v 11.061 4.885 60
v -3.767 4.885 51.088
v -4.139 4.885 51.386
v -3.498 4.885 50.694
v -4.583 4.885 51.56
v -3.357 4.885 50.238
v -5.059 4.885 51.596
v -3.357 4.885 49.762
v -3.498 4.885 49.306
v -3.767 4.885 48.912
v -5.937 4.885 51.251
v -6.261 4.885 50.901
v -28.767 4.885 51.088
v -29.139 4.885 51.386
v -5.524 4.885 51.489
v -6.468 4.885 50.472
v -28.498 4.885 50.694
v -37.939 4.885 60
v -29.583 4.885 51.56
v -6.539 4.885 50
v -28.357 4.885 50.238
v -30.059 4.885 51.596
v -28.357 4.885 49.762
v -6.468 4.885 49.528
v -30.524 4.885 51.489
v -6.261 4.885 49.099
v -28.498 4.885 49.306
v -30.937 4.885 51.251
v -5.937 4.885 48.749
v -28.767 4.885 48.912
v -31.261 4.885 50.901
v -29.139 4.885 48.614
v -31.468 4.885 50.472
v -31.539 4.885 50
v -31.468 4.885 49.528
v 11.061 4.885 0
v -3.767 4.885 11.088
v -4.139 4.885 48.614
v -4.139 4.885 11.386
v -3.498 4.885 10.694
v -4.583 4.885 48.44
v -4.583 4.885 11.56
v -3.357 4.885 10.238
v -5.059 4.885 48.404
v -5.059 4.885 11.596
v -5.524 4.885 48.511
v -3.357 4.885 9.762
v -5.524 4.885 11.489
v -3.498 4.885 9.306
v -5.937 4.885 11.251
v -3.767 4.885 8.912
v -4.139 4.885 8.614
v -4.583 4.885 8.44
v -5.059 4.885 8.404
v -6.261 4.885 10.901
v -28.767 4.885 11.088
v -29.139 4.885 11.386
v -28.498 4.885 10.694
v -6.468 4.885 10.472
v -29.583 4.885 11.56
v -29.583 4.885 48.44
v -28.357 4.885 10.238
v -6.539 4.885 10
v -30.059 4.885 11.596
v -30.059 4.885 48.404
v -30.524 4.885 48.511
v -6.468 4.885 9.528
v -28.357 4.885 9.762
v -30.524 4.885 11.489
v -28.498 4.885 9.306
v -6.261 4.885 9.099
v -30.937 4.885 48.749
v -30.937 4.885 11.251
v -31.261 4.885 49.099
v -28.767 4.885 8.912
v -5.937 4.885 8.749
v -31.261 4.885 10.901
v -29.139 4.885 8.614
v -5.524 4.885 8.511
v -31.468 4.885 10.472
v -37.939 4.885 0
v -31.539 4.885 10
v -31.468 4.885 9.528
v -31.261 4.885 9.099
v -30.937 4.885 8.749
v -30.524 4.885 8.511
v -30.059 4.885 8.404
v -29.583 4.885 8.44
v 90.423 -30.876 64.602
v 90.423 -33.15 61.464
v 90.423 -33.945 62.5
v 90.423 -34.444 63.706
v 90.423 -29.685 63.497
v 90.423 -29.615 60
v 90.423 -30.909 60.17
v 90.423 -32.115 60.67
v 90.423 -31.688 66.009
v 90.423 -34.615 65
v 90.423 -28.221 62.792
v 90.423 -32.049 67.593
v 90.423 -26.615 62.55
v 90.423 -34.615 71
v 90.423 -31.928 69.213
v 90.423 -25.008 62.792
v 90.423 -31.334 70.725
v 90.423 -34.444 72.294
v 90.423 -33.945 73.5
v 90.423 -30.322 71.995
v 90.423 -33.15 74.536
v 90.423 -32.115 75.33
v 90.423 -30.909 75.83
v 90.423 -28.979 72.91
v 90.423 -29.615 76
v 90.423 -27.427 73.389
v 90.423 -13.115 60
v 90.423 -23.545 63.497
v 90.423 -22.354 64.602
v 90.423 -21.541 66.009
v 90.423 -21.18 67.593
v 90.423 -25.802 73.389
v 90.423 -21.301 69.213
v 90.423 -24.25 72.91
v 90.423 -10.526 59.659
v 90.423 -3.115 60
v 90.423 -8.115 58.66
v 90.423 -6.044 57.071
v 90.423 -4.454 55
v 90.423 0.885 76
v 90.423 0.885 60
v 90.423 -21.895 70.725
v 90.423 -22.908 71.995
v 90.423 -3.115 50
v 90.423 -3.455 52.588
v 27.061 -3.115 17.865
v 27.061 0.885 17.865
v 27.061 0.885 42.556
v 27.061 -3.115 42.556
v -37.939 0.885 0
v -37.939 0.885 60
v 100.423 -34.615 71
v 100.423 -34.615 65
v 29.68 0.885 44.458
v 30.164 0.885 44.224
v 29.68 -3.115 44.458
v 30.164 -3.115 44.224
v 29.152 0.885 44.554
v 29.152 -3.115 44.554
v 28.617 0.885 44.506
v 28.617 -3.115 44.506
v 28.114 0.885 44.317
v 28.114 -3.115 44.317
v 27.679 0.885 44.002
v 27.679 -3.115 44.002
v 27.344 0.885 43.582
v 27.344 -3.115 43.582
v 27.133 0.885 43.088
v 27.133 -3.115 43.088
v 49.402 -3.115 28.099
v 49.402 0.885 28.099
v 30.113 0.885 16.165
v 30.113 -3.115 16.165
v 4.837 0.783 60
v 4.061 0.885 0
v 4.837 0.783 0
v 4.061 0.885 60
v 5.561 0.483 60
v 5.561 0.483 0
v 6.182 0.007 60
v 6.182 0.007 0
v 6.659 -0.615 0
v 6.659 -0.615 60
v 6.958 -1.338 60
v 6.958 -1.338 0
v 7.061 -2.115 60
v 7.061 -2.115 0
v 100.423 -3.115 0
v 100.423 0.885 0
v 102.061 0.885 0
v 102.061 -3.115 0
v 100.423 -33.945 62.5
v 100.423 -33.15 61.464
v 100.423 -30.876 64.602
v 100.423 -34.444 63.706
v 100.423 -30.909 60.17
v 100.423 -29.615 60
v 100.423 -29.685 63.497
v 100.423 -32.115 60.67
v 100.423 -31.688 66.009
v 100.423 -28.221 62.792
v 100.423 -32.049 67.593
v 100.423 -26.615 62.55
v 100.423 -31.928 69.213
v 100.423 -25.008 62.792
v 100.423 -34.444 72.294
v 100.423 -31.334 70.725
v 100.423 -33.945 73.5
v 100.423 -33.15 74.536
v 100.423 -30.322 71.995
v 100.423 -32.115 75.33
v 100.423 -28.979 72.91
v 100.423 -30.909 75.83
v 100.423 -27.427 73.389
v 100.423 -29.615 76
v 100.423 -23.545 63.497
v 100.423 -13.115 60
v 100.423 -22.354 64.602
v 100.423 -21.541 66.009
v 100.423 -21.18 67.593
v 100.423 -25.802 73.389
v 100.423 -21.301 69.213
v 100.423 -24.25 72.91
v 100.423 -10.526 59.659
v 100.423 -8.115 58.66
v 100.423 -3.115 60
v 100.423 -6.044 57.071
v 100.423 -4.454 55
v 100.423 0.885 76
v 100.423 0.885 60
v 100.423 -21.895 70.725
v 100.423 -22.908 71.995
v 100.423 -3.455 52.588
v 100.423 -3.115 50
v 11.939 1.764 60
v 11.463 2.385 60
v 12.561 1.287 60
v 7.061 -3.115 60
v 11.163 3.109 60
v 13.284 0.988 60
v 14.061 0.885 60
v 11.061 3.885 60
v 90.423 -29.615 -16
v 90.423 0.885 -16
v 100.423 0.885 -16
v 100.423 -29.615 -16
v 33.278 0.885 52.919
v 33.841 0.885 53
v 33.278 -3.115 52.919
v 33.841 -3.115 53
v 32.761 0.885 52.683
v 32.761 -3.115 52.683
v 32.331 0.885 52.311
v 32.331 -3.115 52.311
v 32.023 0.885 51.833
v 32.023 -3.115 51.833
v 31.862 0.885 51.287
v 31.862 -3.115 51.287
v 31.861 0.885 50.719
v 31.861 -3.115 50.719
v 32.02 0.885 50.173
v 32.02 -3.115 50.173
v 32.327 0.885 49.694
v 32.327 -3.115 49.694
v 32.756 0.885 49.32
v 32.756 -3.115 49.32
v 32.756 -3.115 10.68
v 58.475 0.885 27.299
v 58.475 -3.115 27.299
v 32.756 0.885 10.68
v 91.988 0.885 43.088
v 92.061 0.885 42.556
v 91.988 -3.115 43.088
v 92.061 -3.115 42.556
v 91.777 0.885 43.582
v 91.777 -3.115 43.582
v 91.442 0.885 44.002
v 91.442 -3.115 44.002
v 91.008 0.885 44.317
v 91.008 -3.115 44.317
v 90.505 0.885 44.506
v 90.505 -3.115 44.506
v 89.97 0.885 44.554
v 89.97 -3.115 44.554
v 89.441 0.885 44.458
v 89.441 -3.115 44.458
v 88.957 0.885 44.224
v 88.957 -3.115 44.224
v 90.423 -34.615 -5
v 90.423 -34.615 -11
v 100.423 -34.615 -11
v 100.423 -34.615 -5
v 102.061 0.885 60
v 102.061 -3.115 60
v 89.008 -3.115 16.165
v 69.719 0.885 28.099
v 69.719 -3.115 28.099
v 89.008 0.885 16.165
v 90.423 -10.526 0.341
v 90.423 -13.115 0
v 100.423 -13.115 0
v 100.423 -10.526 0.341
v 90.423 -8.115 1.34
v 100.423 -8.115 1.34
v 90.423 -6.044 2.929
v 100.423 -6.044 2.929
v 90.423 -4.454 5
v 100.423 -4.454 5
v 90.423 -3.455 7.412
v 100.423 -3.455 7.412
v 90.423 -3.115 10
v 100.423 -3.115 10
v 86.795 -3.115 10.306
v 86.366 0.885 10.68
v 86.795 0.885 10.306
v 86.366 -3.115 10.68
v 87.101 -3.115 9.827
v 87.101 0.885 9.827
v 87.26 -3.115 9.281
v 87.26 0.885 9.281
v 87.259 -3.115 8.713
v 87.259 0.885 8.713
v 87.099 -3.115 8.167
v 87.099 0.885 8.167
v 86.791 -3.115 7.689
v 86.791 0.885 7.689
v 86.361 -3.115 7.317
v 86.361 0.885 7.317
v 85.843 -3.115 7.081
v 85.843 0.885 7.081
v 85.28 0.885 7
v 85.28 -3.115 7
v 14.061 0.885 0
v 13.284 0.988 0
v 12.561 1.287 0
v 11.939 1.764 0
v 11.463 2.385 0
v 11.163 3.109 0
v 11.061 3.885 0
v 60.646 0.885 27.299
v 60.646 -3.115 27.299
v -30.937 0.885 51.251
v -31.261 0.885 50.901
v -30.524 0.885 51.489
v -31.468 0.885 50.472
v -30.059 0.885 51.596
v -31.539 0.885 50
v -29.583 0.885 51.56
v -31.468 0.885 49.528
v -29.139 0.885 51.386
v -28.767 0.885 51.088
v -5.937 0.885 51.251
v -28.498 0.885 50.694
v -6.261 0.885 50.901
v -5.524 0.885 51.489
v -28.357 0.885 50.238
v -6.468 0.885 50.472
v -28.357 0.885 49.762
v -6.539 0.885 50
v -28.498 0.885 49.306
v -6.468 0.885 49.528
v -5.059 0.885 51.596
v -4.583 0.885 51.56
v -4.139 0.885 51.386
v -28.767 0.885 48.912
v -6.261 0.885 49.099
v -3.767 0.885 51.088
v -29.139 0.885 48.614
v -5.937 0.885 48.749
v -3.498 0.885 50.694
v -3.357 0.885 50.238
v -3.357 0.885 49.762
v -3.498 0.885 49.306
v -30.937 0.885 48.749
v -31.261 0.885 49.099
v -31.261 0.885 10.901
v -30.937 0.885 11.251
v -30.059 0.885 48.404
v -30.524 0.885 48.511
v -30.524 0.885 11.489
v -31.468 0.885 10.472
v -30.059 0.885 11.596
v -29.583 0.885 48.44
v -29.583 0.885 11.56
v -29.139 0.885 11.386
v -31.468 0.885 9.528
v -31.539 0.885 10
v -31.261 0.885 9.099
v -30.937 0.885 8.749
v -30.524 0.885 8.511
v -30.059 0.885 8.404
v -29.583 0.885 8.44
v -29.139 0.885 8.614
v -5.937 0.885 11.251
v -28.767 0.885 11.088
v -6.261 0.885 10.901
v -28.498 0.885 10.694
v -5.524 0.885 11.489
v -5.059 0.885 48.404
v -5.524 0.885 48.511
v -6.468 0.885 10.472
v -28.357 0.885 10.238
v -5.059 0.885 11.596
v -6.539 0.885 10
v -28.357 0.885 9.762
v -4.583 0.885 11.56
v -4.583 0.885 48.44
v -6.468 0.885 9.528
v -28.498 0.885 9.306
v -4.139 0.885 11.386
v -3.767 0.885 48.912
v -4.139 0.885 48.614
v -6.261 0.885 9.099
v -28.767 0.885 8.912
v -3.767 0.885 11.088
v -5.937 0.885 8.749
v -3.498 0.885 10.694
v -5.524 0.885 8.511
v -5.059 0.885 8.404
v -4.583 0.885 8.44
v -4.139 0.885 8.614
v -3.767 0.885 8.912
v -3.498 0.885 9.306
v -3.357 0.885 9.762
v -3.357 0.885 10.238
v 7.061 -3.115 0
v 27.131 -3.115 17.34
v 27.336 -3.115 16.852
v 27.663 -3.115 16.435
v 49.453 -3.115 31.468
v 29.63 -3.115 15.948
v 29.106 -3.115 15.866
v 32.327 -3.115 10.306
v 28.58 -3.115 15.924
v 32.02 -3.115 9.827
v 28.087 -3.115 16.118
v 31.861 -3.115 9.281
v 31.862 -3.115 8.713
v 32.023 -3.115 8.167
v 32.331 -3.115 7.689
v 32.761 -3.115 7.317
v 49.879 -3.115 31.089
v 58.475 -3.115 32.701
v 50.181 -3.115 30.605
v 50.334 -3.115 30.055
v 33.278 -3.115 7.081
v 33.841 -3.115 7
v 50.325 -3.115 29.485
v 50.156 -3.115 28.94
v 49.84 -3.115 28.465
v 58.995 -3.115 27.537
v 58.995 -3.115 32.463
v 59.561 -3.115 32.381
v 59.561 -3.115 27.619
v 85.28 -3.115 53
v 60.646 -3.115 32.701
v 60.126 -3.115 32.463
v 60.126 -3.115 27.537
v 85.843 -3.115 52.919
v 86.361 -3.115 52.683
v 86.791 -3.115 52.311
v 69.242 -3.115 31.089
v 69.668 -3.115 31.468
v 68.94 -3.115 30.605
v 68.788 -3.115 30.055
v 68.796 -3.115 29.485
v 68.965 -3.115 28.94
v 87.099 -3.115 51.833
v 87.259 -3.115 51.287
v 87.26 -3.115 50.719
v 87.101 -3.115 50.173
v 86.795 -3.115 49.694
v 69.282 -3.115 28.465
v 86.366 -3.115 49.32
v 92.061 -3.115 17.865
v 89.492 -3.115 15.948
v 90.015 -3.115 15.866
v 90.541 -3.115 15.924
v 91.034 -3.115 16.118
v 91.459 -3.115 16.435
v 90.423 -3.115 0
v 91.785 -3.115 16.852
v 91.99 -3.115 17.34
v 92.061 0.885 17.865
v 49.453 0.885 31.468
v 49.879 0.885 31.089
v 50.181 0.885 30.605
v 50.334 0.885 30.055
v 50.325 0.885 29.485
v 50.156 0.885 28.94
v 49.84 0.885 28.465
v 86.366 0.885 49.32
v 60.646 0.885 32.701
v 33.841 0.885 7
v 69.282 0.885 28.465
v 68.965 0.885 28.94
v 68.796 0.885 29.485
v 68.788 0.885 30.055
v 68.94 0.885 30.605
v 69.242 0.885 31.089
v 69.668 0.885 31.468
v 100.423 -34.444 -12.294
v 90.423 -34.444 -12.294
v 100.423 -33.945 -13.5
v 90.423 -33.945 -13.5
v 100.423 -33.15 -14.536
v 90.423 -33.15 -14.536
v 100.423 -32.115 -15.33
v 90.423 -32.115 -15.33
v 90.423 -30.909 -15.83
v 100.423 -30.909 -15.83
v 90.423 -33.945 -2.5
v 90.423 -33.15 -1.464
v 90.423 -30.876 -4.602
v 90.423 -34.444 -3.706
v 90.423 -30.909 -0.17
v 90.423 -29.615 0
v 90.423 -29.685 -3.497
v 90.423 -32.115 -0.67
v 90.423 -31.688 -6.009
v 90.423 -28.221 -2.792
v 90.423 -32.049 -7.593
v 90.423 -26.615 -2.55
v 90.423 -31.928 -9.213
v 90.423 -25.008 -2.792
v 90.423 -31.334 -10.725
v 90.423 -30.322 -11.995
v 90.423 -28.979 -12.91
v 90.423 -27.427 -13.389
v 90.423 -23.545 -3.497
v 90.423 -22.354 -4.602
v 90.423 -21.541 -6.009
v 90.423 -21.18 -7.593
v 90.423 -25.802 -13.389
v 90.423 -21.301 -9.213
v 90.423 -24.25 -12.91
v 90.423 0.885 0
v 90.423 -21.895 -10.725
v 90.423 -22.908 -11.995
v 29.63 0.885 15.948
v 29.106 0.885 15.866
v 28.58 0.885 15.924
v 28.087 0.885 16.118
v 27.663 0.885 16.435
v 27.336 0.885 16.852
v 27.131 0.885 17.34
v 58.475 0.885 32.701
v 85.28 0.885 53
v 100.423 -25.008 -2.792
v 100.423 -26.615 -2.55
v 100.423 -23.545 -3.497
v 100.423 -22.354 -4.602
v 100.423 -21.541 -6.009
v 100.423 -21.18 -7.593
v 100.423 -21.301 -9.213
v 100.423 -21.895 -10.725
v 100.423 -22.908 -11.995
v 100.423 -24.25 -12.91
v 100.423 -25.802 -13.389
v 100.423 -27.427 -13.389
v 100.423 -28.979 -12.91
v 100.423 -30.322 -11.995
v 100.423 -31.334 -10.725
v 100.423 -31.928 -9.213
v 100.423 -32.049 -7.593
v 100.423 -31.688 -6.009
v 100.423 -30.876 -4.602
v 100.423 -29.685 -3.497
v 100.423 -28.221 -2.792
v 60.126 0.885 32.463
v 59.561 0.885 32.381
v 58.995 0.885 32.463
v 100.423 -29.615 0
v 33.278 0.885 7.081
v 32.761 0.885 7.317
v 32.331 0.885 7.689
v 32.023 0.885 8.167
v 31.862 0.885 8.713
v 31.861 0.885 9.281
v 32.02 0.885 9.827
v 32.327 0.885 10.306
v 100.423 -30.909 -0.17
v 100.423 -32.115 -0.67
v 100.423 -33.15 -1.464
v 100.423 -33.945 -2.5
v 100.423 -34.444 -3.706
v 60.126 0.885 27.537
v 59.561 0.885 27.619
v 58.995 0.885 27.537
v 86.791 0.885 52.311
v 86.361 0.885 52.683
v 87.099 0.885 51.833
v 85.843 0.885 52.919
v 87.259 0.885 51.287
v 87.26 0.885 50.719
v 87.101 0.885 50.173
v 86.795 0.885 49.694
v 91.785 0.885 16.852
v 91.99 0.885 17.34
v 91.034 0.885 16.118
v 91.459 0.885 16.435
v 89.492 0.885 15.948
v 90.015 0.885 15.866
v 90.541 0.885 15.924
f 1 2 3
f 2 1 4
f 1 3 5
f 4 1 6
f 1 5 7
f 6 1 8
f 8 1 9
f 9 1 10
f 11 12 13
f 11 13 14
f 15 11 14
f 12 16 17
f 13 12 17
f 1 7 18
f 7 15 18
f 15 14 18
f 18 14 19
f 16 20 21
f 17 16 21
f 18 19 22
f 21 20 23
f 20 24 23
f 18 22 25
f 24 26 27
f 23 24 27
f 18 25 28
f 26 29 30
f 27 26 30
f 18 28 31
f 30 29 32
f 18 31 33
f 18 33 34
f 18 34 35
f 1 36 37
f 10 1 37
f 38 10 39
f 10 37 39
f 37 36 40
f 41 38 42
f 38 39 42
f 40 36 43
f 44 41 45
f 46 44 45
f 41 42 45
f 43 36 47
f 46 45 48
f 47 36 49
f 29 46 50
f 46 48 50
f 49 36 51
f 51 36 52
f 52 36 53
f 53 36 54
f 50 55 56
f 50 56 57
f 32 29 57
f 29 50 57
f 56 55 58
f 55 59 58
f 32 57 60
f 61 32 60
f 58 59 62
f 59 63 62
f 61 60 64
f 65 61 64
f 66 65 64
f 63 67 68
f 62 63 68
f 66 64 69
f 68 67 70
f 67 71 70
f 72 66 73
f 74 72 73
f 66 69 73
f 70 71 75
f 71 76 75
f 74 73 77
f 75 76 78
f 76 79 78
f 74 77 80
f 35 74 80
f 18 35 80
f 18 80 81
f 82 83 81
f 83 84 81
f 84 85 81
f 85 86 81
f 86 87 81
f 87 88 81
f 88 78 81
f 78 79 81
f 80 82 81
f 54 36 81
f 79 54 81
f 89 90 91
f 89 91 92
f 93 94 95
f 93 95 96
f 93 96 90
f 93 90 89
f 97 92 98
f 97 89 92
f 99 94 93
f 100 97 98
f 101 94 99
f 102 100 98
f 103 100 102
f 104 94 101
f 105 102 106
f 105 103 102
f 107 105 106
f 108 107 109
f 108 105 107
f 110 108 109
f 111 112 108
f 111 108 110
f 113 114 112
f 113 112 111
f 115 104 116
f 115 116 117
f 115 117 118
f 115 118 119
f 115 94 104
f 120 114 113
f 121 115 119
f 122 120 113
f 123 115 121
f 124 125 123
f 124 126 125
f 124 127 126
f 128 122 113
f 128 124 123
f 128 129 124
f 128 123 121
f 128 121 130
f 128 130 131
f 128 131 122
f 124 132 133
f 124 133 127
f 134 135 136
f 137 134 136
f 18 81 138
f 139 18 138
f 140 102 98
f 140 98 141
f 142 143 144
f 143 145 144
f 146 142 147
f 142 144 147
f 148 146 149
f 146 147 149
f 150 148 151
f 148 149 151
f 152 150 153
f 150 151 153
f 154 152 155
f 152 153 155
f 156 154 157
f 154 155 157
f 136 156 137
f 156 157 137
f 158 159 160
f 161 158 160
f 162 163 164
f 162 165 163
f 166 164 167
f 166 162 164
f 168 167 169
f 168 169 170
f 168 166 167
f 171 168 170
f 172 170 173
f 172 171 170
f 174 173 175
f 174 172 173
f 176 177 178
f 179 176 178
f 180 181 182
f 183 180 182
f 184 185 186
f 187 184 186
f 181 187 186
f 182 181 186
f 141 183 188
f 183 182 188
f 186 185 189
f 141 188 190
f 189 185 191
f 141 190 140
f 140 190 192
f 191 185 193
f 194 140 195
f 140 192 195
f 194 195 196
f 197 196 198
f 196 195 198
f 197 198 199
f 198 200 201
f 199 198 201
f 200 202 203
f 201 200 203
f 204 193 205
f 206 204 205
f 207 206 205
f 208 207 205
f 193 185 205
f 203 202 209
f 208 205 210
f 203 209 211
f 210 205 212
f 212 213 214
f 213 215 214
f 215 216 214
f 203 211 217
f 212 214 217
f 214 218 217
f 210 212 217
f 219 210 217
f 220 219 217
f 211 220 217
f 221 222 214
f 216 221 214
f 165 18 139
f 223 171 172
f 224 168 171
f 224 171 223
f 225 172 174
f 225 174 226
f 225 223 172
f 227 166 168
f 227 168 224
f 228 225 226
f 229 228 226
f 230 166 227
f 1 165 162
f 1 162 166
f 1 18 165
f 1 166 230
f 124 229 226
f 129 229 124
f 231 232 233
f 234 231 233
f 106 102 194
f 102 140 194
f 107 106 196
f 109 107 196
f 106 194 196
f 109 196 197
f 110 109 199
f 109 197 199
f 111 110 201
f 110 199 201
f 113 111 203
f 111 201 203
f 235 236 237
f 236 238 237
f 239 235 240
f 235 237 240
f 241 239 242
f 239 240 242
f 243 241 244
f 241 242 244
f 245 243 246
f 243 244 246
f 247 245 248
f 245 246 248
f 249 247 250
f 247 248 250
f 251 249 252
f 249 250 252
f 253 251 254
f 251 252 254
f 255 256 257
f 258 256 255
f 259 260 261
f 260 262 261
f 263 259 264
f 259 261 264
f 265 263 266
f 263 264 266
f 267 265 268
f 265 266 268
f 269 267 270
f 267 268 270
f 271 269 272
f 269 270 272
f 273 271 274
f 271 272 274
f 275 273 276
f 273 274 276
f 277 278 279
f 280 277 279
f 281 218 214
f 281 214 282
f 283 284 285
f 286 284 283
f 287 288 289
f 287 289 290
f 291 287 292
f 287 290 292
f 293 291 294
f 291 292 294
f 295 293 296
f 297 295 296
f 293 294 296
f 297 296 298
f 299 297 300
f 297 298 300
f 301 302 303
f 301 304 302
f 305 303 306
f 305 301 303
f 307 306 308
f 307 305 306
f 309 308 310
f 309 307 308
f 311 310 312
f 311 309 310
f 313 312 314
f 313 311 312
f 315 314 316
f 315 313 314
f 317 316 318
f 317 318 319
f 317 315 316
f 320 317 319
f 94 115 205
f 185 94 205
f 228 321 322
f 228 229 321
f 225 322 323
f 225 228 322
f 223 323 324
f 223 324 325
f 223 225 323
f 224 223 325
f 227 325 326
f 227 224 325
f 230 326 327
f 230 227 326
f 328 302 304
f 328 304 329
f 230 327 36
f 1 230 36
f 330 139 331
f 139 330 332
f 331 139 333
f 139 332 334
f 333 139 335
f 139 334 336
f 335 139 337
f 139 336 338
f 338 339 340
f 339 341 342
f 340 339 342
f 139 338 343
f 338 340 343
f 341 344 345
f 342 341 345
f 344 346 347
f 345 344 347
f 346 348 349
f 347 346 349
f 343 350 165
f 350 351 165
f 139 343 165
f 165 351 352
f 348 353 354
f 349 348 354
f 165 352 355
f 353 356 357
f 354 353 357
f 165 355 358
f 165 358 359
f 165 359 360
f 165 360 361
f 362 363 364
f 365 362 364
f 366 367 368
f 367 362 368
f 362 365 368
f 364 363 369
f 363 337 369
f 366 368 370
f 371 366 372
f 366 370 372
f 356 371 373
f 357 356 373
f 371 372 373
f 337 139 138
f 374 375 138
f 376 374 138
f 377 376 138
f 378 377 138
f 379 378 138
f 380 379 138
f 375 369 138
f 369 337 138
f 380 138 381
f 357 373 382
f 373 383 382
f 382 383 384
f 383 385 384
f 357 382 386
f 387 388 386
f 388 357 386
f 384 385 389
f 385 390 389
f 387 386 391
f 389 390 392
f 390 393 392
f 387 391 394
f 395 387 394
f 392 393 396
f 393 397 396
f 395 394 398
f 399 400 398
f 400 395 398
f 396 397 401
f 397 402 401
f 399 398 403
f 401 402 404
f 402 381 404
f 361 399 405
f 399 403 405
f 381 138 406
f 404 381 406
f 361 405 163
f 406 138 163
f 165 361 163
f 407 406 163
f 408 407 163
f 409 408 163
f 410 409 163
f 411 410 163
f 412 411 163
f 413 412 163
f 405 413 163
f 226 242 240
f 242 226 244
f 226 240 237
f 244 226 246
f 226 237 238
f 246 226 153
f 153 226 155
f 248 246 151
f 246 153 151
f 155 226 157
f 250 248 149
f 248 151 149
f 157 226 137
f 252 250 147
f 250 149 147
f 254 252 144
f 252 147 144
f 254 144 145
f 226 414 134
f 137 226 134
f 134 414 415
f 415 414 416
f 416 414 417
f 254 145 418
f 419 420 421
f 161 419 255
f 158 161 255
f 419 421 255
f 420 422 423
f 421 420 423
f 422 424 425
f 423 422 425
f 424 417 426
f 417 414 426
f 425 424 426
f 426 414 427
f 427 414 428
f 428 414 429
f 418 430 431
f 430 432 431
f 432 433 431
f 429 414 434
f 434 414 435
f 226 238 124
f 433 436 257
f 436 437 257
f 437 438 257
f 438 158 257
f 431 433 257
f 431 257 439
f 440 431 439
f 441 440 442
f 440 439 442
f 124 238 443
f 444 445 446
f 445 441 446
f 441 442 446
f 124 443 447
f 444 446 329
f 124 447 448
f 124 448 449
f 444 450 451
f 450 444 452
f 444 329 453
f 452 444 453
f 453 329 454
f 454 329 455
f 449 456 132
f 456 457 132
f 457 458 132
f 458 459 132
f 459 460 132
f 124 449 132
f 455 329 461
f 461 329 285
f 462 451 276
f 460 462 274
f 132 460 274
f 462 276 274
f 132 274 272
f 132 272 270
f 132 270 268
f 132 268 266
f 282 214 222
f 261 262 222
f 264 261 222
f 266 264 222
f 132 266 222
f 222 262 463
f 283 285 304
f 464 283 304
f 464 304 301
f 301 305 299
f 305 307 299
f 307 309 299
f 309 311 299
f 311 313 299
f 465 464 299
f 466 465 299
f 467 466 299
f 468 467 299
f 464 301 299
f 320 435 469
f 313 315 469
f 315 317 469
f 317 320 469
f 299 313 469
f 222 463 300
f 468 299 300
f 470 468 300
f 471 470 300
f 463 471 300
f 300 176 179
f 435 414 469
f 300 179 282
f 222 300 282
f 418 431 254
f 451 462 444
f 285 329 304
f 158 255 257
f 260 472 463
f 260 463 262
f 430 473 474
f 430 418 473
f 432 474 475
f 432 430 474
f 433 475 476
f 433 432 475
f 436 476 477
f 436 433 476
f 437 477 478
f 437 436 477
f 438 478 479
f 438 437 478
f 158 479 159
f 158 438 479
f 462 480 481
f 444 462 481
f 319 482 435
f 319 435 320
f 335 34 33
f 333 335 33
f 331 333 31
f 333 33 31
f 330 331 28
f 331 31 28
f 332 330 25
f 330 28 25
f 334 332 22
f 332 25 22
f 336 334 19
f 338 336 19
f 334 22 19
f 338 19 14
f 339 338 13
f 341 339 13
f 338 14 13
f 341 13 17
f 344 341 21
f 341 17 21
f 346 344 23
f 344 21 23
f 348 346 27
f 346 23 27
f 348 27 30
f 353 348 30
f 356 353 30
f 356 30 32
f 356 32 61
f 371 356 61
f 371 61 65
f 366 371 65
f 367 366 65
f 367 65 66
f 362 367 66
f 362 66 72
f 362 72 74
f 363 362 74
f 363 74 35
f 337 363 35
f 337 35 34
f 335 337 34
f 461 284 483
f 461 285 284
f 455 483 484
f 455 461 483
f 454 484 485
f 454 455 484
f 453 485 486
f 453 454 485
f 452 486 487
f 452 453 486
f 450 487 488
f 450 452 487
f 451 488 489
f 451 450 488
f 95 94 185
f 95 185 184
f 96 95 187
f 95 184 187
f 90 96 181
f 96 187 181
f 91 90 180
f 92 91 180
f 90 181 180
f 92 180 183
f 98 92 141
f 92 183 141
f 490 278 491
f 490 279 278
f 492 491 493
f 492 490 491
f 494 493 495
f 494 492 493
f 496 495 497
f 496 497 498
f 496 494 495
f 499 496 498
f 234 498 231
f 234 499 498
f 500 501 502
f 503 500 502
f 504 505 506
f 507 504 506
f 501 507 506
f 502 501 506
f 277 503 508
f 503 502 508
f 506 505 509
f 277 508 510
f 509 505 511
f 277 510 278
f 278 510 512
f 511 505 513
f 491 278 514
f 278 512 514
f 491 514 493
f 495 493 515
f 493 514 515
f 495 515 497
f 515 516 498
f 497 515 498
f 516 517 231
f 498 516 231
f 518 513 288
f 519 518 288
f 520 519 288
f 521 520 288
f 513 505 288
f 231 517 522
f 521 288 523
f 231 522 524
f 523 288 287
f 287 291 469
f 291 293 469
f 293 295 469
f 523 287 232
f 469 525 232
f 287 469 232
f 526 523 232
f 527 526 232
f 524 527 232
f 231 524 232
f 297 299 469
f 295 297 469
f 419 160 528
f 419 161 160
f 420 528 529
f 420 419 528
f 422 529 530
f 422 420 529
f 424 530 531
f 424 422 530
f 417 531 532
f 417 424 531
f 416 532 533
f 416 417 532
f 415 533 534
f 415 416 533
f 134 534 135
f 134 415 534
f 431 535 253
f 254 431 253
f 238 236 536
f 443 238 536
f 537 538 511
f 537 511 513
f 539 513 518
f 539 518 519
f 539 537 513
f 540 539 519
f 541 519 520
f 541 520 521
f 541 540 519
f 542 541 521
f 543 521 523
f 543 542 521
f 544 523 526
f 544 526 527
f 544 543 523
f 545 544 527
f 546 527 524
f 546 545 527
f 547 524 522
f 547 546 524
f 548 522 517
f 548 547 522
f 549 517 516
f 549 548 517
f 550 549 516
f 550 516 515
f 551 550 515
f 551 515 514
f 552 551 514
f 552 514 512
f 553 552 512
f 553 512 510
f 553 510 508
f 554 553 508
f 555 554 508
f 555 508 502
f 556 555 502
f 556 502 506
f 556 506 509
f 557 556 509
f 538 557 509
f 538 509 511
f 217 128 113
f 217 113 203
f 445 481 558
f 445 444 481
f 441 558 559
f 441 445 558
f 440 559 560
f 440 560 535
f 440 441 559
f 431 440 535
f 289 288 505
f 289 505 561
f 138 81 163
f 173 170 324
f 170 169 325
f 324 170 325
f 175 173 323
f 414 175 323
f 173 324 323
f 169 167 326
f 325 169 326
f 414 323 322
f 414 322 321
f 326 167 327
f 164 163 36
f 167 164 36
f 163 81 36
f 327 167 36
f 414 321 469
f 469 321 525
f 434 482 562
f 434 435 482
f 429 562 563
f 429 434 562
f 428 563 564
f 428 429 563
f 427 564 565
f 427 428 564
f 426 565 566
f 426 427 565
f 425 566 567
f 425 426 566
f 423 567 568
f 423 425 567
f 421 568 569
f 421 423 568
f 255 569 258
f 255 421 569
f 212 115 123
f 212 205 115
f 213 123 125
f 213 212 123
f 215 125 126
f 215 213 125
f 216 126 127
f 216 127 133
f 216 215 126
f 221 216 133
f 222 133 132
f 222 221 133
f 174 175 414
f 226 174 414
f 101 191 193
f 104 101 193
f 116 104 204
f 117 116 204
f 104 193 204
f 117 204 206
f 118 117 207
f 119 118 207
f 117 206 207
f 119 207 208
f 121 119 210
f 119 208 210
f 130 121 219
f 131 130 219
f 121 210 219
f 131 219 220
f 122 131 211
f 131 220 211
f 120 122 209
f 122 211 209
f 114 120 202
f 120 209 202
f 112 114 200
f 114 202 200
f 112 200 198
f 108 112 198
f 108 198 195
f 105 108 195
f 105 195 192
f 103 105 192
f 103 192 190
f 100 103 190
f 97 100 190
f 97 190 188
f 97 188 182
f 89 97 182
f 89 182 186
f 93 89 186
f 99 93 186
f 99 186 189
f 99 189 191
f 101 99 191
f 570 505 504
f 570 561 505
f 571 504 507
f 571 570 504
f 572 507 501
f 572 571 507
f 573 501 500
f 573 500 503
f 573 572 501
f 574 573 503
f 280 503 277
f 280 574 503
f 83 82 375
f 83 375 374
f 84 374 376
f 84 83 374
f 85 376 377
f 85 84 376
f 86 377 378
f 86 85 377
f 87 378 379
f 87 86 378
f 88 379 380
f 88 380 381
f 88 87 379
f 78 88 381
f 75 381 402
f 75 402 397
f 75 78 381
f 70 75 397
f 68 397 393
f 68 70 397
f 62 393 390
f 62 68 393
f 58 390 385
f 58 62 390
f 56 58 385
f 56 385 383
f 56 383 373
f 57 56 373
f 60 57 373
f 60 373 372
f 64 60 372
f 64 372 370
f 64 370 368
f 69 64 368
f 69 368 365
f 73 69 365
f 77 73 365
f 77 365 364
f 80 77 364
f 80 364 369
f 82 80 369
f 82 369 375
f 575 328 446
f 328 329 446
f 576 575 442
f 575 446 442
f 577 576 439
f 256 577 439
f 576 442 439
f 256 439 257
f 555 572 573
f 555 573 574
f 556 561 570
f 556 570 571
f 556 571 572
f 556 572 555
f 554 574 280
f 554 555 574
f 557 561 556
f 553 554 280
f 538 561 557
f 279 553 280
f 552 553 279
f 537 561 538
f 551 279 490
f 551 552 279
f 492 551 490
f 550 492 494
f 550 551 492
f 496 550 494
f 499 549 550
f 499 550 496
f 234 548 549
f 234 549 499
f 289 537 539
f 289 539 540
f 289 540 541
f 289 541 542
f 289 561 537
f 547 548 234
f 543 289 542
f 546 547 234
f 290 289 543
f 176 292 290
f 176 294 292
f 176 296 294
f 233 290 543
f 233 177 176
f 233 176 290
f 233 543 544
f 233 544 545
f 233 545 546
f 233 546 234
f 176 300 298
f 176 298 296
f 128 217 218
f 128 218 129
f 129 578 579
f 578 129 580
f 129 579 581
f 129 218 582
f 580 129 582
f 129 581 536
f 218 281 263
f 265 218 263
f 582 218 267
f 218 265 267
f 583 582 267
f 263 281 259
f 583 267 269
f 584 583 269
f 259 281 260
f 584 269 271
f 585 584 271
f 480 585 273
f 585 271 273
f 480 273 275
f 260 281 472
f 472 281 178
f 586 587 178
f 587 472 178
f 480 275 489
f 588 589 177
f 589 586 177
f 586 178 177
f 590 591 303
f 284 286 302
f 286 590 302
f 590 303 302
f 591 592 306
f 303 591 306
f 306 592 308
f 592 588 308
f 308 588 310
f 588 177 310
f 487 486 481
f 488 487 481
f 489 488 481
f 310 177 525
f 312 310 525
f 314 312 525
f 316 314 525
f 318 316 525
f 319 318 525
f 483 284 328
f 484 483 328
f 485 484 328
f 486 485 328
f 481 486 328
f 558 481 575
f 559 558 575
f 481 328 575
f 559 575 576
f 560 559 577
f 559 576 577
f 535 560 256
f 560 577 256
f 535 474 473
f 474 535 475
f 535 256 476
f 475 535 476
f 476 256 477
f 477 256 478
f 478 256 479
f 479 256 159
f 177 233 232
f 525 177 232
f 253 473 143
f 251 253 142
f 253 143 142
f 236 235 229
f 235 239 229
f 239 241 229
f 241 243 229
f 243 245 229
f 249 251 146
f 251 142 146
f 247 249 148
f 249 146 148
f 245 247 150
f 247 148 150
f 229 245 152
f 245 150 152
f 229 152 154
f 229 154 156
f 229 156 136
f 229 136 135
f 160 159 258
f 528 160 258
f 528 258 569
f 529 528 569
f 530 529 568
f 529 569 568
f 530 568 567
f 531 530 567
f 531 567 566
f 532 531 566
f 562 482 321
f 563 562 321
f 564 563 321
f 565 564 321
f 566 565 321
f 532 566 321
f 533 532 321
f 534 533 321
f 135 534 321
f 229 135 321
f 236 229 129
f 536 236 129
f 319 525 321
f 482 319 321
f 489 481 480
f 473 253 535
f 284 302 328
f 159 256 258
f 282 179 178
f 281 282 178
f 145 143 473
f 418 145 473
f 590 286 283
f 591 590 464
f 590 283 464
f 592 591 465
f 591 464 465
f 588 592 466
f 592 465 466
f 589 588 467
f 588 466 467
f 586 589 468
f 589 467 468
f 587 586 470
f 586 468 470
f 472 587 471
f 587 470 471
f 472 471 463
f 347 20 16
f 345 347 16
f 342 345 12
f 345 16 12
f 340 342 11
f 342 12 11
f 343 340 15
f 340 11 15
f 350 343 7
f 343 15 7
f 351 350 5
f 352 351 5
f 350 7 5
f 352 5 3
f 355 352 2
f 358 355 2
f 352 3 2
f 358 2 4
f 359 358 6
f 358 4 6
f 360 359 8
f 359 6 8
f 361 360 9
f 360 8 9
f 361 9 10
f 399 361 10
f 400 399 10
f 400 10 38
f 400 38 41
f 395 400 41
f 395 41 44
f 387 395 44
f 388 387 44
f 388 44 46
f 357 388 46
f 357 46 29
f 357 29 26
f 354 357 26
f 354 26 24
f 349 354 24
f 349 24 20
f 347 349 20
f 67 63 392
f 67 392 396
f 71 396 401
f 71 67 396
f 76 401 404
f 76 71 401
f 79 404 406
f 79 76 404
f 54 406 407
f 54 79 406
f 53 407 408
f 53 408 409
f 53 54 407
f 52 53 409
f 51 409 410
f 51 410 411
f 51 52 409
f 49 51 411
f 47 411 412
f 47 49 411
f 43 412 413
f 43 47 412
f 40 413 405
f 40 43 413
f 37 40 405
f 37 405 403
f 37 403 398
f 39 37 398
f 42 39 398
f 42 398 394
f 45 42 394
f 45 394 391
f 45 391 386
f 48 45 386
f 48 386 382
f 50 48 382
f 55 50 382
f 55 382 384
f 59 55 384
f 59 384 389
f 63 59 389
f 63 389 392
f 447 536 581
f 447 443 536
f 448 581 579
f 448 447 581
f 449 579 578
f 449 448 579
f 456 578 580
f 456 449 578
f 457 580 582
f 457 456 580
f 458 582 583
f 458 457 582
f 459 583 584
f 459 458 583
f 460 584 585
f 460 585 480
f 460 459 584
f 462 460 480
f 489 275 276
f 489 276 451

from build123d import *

# Parameters (mm, degrees)
BOSS_EXTRUDE1_DEPTH  = 60
FILLET1_R            = 3
CUT_EXTRUDE1_REACH   = 120.661
SKETCH2_R            = 1.6
CUT_EXTRUDE2_REACH   = 120.458
FILLET2_R            = 2
SKETCH5_W            = 10
SKETCH5_H            = 4
BOSS_EXTRUDE2_DEPTH  = 16
SKETCH6_W            = 10
SKETCH6_H            = 16
BOSS_EXTRUDE3_DEPTH  = 31.5
CUT_EXTRUDE3_REACH   = 163.612
SKETCH7_R            = 5.45
FILLET3_R            = 5
FILLET4_R            = 10
FILLET3_OF_MIRROR3_R = 5
FILLET4_OF_MIRROR3_R = 10


with BuildPart() as part:
    # Sketch1 → Boss-Extrude1 (new body)
    with BuildSketch(Plane.XY):
        Polygon((-37.939393939, 0.885392049), (7.060606061, 0.885392049), (7.060606061, -3.114607951), (102.060606061, -3.114607951), (102.060606061, 0.885392049), (11.060606061, 0.885392049), (11.060606061, 4.885392049), (-37.939393939, 4.885392049), align=None)
    extrude(amount=BOSS_EXTRUDE1_DEPTH)

    # Fillet1
    fillet1_edges = [part.edges().sort_by_distance(p)[0] for p in [
        (7.060606061, 0.885392049, 30),
        (11.060606061, 0.885392049, 30),
    ]]
    fillet(fillet1_edges, radius=FILLET1_R)

    # Sketch2 → Cut-Extrude1 (cut, up to next)
    with BuildSketch(Plane(origin=(0, 4.885392049, 0), x_dir=(1, 0, 0), z_dir=(0, 1, 0)), mode=Mode.PRIVATE) as cut_extrude1_sk1:
        with Locations(Location((-4.939393939, -50, 0), (0, 0, 180))):
            Circle(SKETCH2_R)
    cut_extrude1_tool1 = extrude(cut_extrude1_sk1.sketch, amount=-CUT_EXTRUDE1_REACH, mode=Mode.PRIVATE) & part.part
    # Sketch2 → Cut-Extrude1 (cut, up to next)
    with BuildSketch(Plane(origin=(0, 4.885392049, 0), x_dir=(1, 0, 0), z_dir=(0, 1, 0)), mode=Mode.PRIVATE) as cut_extrude1_sk2:
        with Locations(Location((-29.939393939, -50, 0), (0, 0, 180))):
            Circle(SKETCH2_R)
    cut_extrude1_tool2 = extrude(cut_extrude1_sk2.sketch, amount=-CUT_EXTRUDE1_REACH, mode=Mode.PRIVATE) & part.part
    cut_extrude1_1 = cut_extrude1_tool1.solids().sort_by_distance((-4.939394, 4.885392, 50))[0]
    add(cut_extrude1_1, mode=Mode.SUBTRACT)
    cut_extrude1_2 = cut_extrude1_tool2.solids().sort_by_distance((-29.939394, 4.885392, 50))[0]
    add(cut_extrude1_2, mode=Mode.SUBTRACT)
    cut_extrude1 = cut_extrude1_1 + cut_extrude1_2  # Cut-Extrude1 as one shape, for the pattern or mirror that repeats it

    # Mirror2: Cut-Extrude1 across plane
    add(cut_extrude1.mirror(Plane.XY.offset(30)), mode=Mode.SUBTRACT)

    # Sketch4 → Cut-Extrude2 (cut, up to next)
    with BuildSketch(Plane(origin=(0, 0.885392049, 0), x_dir=(1, 0, 0), z_dir=(0, 1, 0)), mode=Mode.PRIVATE) as cut_extrude2_sk1:
        Polygon((27.060606061, -14.276205352), (27.060606061, -46.276205352), (52.060606061, -29.743980797), align=None)
    cut_extrude2_tool1 = extrude(cut_extrude2_sk1.sketch, amount=-CUT_EXTRUDE2_REACH, mode=Mode.PRIVATE) & part.part
    # Sketch4 → Cut-Extrude2 (cut, up to next)
    with BuildSketch(Plane(origin=(0, 0.885392049, 0), x_dir=(1, 0, 0), z_dir=(0, 1, 0)), mode=Mode.PRIVATE) as cut_extrude2_sk2:
        Polygon((59.560606061, -32), (27.060606061, -53), (92.060606061, -53), align=None)
    cut_extrude2_tool2 = extrude(cut_extrude2_sk2.sketch, amount=-CUT_EXTRUDE2_REACH, mode=Mode.PRIVATE) & part.part
    # Sketch4 → Cut-Extrude2 (cut, up to next)
    with BuildSketch(Plane(origin=(0, 0.885392049, 0), x_dir=(1, 0, 0), z_dir=(0, 1, 0)), mode=Mode.PRIVATE) as cut_extrude2_sk3:
        Polygon((67.060606061, -29.743980797), (92.060606061, -14.276205352), (92.060606061, -46.276205352), align=None)
    cut_extrude2_tool3 = extrude(cut_extrude2_sk3.sketch, amount=-CUT_EXTRUDE2_REACH, mode=Mode.PRIVATE) & part.part
    # Sketch4 → Cut-Extrude2 (cut, up to next)
    with BuildSketch(Plane(origin=(0, 0.885392049, 0), x_dir=(1, 0, 0), z_dir=(0, 1, 0)), mode=Mode.PRIVATE) as cut_extrude2_sk4:
        Polygon((92.060606061, -7), (59.560606061, -28), (27.060606061, -7), align=None)
    cut_extrude2_tool4 = extrude(cut_extrude2_sk4.sketch, amount=-CUT_EXTRUDE2_REACH, mode=Mode.PRIVATE) & part.part
    add(cut_extrude2_tool1.solids().sort_by_distance((35.393939, 0.885392, 30.098797))[0], mode=Mode.SUBTRACT)
    add(cut_extrude2_tool2.solids().sort_by_distance((59.560606, 0.885392, 46))[0], mode=Mode.SUBTRACT)
    add(cut_extrude2_tool3.solids().sort_by_distance((83.727273, 0.885392, 30.098797))[0], mode=Mode.SUBTRACT)
    add(cut_extrude2_tool4.solids().sort_by_distance((59.560606, 0.885392, 14))[0], mode=Mode.SUBTRACT)

    # Fillet2
    fillet2_edges = [part.edges().sort_by_distance(p)[0] for p in [
        (59.560606061, -1.114607951, 32),
        (92.060606061, -1.114607951, 53),
        (27.060606061, -1.114607951, 53),
        (92.060606061, -1.114607951, 46.276205352),
        (67.060606061, -1.114607951, 29.743980797),
        (92.060606061, -1.114607951, 14.276205352),
        (27.060606061, -1.114607951, 7),
        (92.060606061, -1.114607951, 7),
        (59.560606061, -1.114607951, 28),
        (27.060606061, -1.114607951, 14.276205352),
        (52.060606061, -1.114607951, 29.743980797),
        (27.060606061, -1.114607951, 46.276205352),
    ]]
    fillet(fillet2_edges, radius=FILLET2_R)

    # Sketch5 → Boss-Extrude2 (add)
    with BuildSketch(Plane.XY.offset(60)):
        with Locations((95.422932692, -1.114607951)):
            Rectangle(SKETCH5_W, SKETCH5_H)
    boss_extrude2 = extrude(amount=BOSS_EXTRUDE2_DEPTH)

    # Sketch6 → Boss-Extrude3 (add)
    with BuildSketch(Plane.XZ.offset(3.114607951)):
        with Locations((95.422932692, 68)):
            Rectangle(SKETCH6_W, SKETCH6_H)
    boss_extrude3 = extrude(amount=BOSS_EXTRUDE3_DEPTH)

    # Sketch7 → Cut-Extrude3 (cut, up to next)
    with BuildSketch(Plane(origin=(100.422932692, 0, 0), x_dir=(0, 0, -1), z_dir=(1, 0, 0)), mode=Mode.PRIVATE) as cut_extrude3_sk1:
        with Locations((-68, -26.614607951)):
            Circle(SKETCH7_R)
    cut_extrude3_tool1 = extrude(cut_extrude3_sk1.sketch, amount=-CUT_EXTRUDE3_REACH, mode=Mode.PRIVATE) & part.part
    cut_extrude3 = cut_extrude3_tool1.solids().sort_by_distance((100.422933, -26.614608, 68))[0]
    add(cut_extrude3, mode=Mode.SUBTRACT)

    # Fillet3
    fillet3_edges = [part.edges().sort_by_distance(p)[0] for p in [
        (95.422932692, -34.614607951, 60),
        (95.422932692, -34.614607951, 76),
    ]]
    fillet(fillet3_edges, radius=FILLET3_R)

    # Fillet4
    fillet4_edges = [part.edges().sort_by_distance(p)[0] for p in [
        (95.422932692, -3.114607951, 60),
    ]]
    fillet(fillet4_edges, radius=FILLET4_R)

    # Mirror3: Boss-Extrude2, Boss-Extrude3, Cut-Extrude3 across plane
    add(boss_extrude2.mirror(Plane.XY.offset(30)))
    add(boss_extrude3.mirror(Plane.XY.offset(30)))
    add(cut_extrude3.mirror(Plane.XY.offset(30)), mode=Mode.SUBTRACT)

    # Fillet3 of Mirror3
    fillet3_of_mirror3_edges = [part.edges().sort_by_distance(p)[0] for p in [
        (95.422932692, -34.614607951, 0),
        (95.422932692, -34.614607951, -16),
    ]]
    fillet(fillet3_of_mirror3_edges, radius=FILLET3_OF_MIRROR3_R)

    # Fillet4 of Mirror3
    fillet4_of_mirror3_edges = [part.edges().sort_by_distance(p)[0] for p in [
        (95.422932692, -3.114607951, 0),
    ]]
    fillet(fillet4_of_mirror3_edges, radius=FILLET4_OF_MIRROR3_R)


solid = part.part
